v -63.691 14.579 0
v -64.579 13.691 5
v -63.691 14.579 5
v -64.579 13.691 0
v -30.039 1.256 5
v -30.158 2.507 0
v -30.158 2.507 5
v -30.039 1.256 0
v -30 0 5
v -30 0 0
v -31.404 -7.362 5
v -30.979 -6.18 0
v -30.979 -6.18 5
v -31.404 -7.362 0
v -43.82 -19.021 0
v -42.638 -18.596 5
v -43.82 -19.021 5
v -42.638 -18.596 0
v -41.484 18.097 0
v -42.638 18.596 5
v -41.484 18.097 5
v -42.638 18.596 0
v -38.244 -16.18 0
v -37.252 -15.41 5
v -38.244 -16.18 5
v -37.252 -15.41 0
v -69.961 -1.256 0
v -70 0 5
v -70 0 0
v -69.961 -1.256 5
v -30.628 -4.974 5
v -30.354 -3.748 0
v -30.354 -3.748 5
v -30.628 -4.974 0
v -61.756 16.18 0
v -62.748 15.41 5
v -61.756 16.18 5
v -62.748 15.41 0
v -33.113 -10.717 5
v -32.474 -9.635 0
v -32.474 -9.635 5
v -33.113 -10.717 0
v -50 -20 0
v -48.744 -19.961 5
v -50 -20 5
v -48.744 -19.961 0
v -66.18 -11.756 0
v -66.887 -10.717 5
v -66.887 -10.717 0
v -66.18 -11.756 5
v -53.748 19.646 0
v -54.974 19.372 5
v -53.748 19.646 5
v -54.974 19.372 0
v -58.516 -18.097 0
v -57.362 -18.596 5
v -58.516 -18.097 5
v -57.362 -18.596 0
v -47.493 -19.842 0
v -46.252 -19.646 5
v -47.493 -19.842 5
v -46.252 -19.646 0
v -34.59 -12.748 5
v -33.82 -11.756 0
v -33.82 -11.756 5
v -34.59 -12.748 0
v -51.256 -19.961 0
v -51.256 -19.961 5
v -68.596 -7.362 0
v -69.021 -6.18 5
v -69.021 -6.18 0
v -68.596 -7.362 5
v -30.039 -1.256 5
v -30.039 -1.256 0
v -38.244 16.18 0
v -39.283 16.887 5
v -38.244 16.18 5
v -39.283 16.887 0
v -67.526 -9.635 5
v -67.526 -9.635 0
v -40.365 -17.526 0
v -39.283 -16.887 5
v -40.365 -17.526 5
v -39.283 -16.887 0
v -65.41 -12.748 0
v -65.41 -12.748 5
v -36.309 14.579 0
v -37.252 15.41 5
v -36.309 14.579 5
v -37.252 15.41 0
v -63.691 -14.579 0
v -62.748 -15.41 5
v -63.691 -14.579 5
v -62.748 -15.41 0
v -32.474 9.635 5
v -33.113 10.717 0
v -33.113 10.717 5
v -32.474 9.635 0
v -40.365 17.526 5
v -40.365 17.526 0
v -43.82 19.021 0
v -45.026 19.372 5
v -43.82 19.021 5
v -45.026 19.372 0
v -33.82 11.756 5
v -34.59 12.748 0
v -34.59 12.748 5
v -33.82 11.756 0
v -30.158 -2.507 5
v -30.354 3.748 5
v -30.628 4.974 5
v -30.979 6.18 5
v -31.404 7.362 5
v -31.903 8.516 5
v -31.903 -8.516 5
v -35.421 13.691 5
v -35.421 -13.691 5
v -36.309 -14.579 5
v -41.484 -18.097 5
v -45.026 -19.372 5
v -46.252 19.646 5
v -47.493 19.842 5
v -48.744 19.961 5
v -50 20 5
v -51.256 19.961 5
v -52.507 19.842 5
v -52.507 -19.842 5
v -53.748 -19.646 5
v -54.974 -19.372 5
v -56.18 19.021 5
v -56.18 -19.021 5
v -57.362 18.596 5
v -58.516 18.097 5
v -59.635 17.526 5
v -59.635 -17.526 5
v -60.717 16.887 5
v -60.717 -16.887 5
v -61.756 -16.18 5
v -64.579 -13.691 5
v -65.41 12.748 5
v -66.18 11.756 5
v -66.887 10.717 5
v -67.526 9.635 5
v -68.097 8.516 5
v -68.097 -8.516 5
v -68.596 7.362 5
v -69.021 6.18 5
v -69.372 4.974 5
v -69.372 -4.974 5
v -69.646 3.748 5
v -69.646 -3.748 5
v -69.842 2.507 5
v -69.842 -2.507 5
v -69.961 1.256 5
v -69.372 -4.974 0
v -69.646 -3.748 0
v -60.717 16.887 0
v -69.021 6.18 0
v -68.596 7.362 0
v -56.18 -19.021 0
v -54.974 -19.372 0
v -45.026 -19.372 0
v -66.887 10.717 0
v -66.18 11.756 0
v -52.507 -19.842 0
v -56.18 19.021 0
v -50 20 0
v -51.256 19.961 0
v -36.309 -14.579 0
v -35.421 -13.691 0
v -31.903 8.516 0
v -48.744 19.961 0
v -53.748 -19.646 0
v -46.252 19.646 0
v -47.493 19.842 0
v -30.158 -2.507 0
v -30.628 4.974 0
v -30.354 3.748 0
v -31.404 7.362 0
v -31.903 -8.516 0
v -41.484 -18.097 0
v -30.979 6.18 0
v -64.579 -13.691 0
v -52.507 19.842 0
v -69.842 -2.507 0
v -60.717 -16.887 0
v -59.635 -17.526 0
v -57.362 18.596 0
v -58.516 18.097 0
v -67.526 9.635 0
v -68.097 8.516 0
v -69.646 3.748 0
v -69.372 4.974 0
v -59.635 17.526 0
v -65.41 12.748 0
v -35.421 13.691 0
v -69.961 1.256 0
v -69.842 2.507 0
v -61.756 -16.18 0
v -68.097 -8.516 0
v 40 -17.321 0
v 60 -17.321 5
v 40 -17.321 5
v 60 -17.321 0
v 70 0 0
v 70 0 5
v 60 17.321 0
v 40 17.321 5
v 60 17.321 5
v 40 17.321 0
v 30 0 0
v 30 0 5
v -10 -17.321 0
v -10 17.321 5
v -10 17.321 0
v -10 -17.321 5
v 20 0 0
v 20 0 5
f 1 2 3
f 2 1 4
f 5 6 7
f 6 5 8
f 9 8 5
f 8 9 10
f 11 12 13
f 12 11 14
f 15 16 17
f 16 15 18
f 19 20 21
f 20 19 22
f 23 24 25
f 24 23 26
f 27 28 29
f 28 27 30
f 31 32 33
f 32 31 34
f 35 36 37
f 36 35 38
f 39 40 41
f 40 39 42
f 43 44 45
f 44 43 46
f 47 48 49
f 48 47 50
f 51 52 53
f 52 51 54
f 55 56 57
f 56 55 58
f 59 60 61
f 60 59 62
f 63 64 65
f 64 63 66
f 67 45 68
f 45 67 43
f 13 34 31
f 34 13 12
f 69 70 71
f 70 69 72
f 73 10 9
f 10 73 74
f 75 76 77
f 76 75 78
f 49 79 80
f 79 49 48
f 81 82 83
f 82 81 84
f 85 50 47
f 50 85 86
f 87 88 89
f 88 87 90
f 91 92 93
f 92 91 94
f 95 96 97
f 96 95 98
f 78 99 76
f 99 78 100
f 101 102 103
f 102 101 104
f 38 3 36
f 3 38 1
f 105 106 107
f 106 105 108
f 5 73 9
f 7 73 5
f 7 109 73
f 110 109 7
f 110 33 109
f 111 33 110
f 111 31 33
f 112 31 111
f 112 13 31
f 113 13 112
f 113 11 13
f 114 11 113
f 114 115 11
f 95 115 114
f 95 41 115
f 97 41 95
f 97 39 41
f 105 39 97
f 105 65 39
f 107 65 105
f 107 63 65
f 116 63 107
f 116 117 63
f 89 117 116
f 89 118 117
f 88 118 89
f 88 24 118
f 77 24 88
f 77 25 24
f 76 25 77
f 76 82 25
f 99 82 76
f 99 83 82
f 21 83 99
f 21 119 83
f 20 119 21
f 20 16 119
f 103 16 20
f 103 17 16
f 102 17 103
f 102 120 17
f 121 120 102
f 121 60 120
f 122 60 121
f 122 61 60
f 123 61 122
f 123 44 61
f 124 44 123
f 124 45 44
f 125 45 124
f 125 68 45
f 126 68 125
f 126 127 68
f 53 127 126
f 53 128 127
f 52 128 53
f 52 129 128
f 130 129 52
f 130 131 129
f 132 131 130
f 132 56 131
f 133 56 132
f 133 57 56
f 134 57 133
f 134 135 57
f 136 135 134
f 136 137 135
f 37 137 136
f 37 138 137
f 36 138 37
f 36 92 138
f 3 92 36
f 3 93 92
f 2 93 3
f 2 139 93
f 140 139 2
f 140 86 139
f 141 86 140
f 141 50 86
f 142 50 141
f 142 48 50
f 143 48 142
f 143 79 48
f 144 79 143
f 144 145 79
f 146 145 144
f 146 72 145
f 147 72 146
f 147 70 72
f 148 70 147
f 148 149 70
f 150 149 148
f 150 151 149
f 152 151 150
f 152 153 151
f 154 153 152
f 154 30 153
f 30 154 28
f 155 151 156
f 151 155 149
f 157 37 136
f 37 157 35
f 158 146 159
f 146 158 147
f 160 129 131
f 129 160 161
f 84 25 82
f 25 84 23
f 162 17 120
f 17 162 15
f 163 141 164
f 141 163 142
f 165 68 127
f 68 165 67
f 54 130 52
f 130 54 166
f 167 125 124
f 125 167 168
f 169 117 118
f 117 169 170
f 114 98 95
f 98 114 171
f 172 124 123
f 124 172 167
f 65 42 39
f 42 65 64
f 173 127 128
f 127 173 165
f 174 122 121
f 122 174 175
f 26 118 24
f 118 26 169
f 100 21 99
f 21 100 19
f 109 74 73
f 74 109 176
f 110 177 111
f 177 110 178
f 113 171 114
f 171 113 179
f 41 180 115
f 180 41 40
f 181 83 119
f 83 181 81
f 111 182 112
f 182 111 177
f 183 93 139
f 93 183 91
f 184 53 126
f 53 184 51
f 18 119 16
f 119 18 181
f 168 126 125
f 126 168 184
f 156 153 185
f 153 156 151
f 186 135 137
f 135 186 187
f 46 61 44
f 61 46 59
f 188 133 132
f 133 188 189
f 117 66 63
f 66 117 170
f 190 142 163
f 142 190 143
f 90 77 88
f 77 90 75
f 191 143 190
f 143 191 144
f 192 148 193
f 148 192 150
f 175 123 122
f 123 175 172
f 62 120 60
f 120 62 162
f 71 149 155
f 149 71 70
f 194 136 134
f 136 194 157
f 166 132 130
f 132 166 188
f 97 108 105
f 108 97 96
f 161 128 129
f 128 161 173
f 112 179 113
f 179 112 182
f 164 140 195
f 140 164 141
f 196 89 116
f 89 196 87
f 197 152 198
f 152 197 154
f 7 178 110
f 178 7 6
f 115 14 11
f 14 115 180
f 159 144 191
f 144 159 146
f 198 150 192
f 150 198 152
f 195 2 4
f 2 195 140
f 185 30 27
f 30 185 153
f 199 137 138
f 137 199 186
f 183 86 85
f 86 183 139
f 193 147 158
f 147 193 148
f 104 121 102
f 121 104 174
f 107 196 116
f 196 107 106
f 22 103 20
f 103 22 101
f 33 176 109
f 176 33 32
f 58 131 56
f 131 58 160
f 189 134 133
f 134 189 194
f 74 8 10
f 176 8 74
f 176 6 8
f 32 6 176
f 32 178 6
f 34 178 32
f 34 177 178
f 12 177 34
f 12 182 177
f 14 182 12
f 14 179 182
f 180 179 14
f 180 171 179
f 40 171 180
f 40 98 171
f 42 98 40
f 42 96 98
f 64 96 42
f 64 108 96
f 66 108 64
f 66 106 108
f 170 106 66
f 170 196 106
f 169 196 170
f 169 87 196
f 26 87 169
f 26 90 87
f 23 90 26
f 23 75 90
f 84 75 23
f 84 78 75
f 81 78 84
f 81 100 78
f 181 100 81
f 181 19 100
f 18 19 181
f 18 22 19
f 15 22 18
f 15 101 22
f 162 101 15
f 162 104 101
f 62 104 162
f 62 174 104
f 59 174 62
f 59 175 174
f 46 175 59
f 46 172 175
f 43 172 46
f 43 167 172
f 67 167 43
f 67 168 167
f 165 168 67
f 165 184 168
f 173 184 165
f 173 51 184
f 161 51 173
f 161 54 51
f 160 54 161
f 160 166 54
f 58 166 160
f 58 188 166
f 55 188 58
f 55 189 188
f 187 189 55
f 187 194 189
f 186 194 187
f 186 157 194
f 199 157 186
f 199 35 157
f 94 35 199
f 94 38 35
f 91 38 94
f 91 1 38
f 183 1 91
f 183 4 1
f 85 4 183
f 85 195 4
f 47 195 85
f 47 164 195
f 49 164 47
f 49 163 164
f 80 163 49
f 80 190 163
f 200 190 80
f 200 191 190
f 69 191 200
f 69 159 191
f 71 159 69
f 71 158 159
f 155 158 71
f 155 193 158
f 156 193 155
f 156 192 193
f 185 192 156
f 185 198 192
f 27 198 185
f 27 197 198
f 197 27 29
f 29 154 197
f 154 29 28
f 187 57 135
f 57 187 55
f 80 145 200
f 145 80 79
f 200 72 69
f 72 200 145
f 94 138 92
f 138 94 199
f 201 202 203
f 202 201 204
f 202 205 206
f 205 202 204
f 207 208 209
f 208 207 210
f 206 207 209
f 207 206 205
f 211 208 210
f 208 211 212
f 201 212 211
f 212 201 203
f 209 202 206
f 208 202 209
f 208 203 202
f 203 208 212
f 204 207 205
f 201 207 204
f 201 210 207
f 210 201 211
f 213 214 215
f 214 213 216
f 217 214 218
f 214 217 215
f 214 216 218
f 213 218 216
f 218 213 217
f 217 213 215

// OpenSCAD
translate ([-50,0,0])
cylinder( r=20, h=5, $fn= 100);

// $fn dice el número de lados del cilindro, para suavizar la superficie poner un número mayor, si pone 6 será un hexágono etc etc)

translate ([50,0,0])
cylinder( r=20, h=5, $fn= 6);

translate ([0,0,0])
cylinder( r=20, h=5, $fn= 3);
